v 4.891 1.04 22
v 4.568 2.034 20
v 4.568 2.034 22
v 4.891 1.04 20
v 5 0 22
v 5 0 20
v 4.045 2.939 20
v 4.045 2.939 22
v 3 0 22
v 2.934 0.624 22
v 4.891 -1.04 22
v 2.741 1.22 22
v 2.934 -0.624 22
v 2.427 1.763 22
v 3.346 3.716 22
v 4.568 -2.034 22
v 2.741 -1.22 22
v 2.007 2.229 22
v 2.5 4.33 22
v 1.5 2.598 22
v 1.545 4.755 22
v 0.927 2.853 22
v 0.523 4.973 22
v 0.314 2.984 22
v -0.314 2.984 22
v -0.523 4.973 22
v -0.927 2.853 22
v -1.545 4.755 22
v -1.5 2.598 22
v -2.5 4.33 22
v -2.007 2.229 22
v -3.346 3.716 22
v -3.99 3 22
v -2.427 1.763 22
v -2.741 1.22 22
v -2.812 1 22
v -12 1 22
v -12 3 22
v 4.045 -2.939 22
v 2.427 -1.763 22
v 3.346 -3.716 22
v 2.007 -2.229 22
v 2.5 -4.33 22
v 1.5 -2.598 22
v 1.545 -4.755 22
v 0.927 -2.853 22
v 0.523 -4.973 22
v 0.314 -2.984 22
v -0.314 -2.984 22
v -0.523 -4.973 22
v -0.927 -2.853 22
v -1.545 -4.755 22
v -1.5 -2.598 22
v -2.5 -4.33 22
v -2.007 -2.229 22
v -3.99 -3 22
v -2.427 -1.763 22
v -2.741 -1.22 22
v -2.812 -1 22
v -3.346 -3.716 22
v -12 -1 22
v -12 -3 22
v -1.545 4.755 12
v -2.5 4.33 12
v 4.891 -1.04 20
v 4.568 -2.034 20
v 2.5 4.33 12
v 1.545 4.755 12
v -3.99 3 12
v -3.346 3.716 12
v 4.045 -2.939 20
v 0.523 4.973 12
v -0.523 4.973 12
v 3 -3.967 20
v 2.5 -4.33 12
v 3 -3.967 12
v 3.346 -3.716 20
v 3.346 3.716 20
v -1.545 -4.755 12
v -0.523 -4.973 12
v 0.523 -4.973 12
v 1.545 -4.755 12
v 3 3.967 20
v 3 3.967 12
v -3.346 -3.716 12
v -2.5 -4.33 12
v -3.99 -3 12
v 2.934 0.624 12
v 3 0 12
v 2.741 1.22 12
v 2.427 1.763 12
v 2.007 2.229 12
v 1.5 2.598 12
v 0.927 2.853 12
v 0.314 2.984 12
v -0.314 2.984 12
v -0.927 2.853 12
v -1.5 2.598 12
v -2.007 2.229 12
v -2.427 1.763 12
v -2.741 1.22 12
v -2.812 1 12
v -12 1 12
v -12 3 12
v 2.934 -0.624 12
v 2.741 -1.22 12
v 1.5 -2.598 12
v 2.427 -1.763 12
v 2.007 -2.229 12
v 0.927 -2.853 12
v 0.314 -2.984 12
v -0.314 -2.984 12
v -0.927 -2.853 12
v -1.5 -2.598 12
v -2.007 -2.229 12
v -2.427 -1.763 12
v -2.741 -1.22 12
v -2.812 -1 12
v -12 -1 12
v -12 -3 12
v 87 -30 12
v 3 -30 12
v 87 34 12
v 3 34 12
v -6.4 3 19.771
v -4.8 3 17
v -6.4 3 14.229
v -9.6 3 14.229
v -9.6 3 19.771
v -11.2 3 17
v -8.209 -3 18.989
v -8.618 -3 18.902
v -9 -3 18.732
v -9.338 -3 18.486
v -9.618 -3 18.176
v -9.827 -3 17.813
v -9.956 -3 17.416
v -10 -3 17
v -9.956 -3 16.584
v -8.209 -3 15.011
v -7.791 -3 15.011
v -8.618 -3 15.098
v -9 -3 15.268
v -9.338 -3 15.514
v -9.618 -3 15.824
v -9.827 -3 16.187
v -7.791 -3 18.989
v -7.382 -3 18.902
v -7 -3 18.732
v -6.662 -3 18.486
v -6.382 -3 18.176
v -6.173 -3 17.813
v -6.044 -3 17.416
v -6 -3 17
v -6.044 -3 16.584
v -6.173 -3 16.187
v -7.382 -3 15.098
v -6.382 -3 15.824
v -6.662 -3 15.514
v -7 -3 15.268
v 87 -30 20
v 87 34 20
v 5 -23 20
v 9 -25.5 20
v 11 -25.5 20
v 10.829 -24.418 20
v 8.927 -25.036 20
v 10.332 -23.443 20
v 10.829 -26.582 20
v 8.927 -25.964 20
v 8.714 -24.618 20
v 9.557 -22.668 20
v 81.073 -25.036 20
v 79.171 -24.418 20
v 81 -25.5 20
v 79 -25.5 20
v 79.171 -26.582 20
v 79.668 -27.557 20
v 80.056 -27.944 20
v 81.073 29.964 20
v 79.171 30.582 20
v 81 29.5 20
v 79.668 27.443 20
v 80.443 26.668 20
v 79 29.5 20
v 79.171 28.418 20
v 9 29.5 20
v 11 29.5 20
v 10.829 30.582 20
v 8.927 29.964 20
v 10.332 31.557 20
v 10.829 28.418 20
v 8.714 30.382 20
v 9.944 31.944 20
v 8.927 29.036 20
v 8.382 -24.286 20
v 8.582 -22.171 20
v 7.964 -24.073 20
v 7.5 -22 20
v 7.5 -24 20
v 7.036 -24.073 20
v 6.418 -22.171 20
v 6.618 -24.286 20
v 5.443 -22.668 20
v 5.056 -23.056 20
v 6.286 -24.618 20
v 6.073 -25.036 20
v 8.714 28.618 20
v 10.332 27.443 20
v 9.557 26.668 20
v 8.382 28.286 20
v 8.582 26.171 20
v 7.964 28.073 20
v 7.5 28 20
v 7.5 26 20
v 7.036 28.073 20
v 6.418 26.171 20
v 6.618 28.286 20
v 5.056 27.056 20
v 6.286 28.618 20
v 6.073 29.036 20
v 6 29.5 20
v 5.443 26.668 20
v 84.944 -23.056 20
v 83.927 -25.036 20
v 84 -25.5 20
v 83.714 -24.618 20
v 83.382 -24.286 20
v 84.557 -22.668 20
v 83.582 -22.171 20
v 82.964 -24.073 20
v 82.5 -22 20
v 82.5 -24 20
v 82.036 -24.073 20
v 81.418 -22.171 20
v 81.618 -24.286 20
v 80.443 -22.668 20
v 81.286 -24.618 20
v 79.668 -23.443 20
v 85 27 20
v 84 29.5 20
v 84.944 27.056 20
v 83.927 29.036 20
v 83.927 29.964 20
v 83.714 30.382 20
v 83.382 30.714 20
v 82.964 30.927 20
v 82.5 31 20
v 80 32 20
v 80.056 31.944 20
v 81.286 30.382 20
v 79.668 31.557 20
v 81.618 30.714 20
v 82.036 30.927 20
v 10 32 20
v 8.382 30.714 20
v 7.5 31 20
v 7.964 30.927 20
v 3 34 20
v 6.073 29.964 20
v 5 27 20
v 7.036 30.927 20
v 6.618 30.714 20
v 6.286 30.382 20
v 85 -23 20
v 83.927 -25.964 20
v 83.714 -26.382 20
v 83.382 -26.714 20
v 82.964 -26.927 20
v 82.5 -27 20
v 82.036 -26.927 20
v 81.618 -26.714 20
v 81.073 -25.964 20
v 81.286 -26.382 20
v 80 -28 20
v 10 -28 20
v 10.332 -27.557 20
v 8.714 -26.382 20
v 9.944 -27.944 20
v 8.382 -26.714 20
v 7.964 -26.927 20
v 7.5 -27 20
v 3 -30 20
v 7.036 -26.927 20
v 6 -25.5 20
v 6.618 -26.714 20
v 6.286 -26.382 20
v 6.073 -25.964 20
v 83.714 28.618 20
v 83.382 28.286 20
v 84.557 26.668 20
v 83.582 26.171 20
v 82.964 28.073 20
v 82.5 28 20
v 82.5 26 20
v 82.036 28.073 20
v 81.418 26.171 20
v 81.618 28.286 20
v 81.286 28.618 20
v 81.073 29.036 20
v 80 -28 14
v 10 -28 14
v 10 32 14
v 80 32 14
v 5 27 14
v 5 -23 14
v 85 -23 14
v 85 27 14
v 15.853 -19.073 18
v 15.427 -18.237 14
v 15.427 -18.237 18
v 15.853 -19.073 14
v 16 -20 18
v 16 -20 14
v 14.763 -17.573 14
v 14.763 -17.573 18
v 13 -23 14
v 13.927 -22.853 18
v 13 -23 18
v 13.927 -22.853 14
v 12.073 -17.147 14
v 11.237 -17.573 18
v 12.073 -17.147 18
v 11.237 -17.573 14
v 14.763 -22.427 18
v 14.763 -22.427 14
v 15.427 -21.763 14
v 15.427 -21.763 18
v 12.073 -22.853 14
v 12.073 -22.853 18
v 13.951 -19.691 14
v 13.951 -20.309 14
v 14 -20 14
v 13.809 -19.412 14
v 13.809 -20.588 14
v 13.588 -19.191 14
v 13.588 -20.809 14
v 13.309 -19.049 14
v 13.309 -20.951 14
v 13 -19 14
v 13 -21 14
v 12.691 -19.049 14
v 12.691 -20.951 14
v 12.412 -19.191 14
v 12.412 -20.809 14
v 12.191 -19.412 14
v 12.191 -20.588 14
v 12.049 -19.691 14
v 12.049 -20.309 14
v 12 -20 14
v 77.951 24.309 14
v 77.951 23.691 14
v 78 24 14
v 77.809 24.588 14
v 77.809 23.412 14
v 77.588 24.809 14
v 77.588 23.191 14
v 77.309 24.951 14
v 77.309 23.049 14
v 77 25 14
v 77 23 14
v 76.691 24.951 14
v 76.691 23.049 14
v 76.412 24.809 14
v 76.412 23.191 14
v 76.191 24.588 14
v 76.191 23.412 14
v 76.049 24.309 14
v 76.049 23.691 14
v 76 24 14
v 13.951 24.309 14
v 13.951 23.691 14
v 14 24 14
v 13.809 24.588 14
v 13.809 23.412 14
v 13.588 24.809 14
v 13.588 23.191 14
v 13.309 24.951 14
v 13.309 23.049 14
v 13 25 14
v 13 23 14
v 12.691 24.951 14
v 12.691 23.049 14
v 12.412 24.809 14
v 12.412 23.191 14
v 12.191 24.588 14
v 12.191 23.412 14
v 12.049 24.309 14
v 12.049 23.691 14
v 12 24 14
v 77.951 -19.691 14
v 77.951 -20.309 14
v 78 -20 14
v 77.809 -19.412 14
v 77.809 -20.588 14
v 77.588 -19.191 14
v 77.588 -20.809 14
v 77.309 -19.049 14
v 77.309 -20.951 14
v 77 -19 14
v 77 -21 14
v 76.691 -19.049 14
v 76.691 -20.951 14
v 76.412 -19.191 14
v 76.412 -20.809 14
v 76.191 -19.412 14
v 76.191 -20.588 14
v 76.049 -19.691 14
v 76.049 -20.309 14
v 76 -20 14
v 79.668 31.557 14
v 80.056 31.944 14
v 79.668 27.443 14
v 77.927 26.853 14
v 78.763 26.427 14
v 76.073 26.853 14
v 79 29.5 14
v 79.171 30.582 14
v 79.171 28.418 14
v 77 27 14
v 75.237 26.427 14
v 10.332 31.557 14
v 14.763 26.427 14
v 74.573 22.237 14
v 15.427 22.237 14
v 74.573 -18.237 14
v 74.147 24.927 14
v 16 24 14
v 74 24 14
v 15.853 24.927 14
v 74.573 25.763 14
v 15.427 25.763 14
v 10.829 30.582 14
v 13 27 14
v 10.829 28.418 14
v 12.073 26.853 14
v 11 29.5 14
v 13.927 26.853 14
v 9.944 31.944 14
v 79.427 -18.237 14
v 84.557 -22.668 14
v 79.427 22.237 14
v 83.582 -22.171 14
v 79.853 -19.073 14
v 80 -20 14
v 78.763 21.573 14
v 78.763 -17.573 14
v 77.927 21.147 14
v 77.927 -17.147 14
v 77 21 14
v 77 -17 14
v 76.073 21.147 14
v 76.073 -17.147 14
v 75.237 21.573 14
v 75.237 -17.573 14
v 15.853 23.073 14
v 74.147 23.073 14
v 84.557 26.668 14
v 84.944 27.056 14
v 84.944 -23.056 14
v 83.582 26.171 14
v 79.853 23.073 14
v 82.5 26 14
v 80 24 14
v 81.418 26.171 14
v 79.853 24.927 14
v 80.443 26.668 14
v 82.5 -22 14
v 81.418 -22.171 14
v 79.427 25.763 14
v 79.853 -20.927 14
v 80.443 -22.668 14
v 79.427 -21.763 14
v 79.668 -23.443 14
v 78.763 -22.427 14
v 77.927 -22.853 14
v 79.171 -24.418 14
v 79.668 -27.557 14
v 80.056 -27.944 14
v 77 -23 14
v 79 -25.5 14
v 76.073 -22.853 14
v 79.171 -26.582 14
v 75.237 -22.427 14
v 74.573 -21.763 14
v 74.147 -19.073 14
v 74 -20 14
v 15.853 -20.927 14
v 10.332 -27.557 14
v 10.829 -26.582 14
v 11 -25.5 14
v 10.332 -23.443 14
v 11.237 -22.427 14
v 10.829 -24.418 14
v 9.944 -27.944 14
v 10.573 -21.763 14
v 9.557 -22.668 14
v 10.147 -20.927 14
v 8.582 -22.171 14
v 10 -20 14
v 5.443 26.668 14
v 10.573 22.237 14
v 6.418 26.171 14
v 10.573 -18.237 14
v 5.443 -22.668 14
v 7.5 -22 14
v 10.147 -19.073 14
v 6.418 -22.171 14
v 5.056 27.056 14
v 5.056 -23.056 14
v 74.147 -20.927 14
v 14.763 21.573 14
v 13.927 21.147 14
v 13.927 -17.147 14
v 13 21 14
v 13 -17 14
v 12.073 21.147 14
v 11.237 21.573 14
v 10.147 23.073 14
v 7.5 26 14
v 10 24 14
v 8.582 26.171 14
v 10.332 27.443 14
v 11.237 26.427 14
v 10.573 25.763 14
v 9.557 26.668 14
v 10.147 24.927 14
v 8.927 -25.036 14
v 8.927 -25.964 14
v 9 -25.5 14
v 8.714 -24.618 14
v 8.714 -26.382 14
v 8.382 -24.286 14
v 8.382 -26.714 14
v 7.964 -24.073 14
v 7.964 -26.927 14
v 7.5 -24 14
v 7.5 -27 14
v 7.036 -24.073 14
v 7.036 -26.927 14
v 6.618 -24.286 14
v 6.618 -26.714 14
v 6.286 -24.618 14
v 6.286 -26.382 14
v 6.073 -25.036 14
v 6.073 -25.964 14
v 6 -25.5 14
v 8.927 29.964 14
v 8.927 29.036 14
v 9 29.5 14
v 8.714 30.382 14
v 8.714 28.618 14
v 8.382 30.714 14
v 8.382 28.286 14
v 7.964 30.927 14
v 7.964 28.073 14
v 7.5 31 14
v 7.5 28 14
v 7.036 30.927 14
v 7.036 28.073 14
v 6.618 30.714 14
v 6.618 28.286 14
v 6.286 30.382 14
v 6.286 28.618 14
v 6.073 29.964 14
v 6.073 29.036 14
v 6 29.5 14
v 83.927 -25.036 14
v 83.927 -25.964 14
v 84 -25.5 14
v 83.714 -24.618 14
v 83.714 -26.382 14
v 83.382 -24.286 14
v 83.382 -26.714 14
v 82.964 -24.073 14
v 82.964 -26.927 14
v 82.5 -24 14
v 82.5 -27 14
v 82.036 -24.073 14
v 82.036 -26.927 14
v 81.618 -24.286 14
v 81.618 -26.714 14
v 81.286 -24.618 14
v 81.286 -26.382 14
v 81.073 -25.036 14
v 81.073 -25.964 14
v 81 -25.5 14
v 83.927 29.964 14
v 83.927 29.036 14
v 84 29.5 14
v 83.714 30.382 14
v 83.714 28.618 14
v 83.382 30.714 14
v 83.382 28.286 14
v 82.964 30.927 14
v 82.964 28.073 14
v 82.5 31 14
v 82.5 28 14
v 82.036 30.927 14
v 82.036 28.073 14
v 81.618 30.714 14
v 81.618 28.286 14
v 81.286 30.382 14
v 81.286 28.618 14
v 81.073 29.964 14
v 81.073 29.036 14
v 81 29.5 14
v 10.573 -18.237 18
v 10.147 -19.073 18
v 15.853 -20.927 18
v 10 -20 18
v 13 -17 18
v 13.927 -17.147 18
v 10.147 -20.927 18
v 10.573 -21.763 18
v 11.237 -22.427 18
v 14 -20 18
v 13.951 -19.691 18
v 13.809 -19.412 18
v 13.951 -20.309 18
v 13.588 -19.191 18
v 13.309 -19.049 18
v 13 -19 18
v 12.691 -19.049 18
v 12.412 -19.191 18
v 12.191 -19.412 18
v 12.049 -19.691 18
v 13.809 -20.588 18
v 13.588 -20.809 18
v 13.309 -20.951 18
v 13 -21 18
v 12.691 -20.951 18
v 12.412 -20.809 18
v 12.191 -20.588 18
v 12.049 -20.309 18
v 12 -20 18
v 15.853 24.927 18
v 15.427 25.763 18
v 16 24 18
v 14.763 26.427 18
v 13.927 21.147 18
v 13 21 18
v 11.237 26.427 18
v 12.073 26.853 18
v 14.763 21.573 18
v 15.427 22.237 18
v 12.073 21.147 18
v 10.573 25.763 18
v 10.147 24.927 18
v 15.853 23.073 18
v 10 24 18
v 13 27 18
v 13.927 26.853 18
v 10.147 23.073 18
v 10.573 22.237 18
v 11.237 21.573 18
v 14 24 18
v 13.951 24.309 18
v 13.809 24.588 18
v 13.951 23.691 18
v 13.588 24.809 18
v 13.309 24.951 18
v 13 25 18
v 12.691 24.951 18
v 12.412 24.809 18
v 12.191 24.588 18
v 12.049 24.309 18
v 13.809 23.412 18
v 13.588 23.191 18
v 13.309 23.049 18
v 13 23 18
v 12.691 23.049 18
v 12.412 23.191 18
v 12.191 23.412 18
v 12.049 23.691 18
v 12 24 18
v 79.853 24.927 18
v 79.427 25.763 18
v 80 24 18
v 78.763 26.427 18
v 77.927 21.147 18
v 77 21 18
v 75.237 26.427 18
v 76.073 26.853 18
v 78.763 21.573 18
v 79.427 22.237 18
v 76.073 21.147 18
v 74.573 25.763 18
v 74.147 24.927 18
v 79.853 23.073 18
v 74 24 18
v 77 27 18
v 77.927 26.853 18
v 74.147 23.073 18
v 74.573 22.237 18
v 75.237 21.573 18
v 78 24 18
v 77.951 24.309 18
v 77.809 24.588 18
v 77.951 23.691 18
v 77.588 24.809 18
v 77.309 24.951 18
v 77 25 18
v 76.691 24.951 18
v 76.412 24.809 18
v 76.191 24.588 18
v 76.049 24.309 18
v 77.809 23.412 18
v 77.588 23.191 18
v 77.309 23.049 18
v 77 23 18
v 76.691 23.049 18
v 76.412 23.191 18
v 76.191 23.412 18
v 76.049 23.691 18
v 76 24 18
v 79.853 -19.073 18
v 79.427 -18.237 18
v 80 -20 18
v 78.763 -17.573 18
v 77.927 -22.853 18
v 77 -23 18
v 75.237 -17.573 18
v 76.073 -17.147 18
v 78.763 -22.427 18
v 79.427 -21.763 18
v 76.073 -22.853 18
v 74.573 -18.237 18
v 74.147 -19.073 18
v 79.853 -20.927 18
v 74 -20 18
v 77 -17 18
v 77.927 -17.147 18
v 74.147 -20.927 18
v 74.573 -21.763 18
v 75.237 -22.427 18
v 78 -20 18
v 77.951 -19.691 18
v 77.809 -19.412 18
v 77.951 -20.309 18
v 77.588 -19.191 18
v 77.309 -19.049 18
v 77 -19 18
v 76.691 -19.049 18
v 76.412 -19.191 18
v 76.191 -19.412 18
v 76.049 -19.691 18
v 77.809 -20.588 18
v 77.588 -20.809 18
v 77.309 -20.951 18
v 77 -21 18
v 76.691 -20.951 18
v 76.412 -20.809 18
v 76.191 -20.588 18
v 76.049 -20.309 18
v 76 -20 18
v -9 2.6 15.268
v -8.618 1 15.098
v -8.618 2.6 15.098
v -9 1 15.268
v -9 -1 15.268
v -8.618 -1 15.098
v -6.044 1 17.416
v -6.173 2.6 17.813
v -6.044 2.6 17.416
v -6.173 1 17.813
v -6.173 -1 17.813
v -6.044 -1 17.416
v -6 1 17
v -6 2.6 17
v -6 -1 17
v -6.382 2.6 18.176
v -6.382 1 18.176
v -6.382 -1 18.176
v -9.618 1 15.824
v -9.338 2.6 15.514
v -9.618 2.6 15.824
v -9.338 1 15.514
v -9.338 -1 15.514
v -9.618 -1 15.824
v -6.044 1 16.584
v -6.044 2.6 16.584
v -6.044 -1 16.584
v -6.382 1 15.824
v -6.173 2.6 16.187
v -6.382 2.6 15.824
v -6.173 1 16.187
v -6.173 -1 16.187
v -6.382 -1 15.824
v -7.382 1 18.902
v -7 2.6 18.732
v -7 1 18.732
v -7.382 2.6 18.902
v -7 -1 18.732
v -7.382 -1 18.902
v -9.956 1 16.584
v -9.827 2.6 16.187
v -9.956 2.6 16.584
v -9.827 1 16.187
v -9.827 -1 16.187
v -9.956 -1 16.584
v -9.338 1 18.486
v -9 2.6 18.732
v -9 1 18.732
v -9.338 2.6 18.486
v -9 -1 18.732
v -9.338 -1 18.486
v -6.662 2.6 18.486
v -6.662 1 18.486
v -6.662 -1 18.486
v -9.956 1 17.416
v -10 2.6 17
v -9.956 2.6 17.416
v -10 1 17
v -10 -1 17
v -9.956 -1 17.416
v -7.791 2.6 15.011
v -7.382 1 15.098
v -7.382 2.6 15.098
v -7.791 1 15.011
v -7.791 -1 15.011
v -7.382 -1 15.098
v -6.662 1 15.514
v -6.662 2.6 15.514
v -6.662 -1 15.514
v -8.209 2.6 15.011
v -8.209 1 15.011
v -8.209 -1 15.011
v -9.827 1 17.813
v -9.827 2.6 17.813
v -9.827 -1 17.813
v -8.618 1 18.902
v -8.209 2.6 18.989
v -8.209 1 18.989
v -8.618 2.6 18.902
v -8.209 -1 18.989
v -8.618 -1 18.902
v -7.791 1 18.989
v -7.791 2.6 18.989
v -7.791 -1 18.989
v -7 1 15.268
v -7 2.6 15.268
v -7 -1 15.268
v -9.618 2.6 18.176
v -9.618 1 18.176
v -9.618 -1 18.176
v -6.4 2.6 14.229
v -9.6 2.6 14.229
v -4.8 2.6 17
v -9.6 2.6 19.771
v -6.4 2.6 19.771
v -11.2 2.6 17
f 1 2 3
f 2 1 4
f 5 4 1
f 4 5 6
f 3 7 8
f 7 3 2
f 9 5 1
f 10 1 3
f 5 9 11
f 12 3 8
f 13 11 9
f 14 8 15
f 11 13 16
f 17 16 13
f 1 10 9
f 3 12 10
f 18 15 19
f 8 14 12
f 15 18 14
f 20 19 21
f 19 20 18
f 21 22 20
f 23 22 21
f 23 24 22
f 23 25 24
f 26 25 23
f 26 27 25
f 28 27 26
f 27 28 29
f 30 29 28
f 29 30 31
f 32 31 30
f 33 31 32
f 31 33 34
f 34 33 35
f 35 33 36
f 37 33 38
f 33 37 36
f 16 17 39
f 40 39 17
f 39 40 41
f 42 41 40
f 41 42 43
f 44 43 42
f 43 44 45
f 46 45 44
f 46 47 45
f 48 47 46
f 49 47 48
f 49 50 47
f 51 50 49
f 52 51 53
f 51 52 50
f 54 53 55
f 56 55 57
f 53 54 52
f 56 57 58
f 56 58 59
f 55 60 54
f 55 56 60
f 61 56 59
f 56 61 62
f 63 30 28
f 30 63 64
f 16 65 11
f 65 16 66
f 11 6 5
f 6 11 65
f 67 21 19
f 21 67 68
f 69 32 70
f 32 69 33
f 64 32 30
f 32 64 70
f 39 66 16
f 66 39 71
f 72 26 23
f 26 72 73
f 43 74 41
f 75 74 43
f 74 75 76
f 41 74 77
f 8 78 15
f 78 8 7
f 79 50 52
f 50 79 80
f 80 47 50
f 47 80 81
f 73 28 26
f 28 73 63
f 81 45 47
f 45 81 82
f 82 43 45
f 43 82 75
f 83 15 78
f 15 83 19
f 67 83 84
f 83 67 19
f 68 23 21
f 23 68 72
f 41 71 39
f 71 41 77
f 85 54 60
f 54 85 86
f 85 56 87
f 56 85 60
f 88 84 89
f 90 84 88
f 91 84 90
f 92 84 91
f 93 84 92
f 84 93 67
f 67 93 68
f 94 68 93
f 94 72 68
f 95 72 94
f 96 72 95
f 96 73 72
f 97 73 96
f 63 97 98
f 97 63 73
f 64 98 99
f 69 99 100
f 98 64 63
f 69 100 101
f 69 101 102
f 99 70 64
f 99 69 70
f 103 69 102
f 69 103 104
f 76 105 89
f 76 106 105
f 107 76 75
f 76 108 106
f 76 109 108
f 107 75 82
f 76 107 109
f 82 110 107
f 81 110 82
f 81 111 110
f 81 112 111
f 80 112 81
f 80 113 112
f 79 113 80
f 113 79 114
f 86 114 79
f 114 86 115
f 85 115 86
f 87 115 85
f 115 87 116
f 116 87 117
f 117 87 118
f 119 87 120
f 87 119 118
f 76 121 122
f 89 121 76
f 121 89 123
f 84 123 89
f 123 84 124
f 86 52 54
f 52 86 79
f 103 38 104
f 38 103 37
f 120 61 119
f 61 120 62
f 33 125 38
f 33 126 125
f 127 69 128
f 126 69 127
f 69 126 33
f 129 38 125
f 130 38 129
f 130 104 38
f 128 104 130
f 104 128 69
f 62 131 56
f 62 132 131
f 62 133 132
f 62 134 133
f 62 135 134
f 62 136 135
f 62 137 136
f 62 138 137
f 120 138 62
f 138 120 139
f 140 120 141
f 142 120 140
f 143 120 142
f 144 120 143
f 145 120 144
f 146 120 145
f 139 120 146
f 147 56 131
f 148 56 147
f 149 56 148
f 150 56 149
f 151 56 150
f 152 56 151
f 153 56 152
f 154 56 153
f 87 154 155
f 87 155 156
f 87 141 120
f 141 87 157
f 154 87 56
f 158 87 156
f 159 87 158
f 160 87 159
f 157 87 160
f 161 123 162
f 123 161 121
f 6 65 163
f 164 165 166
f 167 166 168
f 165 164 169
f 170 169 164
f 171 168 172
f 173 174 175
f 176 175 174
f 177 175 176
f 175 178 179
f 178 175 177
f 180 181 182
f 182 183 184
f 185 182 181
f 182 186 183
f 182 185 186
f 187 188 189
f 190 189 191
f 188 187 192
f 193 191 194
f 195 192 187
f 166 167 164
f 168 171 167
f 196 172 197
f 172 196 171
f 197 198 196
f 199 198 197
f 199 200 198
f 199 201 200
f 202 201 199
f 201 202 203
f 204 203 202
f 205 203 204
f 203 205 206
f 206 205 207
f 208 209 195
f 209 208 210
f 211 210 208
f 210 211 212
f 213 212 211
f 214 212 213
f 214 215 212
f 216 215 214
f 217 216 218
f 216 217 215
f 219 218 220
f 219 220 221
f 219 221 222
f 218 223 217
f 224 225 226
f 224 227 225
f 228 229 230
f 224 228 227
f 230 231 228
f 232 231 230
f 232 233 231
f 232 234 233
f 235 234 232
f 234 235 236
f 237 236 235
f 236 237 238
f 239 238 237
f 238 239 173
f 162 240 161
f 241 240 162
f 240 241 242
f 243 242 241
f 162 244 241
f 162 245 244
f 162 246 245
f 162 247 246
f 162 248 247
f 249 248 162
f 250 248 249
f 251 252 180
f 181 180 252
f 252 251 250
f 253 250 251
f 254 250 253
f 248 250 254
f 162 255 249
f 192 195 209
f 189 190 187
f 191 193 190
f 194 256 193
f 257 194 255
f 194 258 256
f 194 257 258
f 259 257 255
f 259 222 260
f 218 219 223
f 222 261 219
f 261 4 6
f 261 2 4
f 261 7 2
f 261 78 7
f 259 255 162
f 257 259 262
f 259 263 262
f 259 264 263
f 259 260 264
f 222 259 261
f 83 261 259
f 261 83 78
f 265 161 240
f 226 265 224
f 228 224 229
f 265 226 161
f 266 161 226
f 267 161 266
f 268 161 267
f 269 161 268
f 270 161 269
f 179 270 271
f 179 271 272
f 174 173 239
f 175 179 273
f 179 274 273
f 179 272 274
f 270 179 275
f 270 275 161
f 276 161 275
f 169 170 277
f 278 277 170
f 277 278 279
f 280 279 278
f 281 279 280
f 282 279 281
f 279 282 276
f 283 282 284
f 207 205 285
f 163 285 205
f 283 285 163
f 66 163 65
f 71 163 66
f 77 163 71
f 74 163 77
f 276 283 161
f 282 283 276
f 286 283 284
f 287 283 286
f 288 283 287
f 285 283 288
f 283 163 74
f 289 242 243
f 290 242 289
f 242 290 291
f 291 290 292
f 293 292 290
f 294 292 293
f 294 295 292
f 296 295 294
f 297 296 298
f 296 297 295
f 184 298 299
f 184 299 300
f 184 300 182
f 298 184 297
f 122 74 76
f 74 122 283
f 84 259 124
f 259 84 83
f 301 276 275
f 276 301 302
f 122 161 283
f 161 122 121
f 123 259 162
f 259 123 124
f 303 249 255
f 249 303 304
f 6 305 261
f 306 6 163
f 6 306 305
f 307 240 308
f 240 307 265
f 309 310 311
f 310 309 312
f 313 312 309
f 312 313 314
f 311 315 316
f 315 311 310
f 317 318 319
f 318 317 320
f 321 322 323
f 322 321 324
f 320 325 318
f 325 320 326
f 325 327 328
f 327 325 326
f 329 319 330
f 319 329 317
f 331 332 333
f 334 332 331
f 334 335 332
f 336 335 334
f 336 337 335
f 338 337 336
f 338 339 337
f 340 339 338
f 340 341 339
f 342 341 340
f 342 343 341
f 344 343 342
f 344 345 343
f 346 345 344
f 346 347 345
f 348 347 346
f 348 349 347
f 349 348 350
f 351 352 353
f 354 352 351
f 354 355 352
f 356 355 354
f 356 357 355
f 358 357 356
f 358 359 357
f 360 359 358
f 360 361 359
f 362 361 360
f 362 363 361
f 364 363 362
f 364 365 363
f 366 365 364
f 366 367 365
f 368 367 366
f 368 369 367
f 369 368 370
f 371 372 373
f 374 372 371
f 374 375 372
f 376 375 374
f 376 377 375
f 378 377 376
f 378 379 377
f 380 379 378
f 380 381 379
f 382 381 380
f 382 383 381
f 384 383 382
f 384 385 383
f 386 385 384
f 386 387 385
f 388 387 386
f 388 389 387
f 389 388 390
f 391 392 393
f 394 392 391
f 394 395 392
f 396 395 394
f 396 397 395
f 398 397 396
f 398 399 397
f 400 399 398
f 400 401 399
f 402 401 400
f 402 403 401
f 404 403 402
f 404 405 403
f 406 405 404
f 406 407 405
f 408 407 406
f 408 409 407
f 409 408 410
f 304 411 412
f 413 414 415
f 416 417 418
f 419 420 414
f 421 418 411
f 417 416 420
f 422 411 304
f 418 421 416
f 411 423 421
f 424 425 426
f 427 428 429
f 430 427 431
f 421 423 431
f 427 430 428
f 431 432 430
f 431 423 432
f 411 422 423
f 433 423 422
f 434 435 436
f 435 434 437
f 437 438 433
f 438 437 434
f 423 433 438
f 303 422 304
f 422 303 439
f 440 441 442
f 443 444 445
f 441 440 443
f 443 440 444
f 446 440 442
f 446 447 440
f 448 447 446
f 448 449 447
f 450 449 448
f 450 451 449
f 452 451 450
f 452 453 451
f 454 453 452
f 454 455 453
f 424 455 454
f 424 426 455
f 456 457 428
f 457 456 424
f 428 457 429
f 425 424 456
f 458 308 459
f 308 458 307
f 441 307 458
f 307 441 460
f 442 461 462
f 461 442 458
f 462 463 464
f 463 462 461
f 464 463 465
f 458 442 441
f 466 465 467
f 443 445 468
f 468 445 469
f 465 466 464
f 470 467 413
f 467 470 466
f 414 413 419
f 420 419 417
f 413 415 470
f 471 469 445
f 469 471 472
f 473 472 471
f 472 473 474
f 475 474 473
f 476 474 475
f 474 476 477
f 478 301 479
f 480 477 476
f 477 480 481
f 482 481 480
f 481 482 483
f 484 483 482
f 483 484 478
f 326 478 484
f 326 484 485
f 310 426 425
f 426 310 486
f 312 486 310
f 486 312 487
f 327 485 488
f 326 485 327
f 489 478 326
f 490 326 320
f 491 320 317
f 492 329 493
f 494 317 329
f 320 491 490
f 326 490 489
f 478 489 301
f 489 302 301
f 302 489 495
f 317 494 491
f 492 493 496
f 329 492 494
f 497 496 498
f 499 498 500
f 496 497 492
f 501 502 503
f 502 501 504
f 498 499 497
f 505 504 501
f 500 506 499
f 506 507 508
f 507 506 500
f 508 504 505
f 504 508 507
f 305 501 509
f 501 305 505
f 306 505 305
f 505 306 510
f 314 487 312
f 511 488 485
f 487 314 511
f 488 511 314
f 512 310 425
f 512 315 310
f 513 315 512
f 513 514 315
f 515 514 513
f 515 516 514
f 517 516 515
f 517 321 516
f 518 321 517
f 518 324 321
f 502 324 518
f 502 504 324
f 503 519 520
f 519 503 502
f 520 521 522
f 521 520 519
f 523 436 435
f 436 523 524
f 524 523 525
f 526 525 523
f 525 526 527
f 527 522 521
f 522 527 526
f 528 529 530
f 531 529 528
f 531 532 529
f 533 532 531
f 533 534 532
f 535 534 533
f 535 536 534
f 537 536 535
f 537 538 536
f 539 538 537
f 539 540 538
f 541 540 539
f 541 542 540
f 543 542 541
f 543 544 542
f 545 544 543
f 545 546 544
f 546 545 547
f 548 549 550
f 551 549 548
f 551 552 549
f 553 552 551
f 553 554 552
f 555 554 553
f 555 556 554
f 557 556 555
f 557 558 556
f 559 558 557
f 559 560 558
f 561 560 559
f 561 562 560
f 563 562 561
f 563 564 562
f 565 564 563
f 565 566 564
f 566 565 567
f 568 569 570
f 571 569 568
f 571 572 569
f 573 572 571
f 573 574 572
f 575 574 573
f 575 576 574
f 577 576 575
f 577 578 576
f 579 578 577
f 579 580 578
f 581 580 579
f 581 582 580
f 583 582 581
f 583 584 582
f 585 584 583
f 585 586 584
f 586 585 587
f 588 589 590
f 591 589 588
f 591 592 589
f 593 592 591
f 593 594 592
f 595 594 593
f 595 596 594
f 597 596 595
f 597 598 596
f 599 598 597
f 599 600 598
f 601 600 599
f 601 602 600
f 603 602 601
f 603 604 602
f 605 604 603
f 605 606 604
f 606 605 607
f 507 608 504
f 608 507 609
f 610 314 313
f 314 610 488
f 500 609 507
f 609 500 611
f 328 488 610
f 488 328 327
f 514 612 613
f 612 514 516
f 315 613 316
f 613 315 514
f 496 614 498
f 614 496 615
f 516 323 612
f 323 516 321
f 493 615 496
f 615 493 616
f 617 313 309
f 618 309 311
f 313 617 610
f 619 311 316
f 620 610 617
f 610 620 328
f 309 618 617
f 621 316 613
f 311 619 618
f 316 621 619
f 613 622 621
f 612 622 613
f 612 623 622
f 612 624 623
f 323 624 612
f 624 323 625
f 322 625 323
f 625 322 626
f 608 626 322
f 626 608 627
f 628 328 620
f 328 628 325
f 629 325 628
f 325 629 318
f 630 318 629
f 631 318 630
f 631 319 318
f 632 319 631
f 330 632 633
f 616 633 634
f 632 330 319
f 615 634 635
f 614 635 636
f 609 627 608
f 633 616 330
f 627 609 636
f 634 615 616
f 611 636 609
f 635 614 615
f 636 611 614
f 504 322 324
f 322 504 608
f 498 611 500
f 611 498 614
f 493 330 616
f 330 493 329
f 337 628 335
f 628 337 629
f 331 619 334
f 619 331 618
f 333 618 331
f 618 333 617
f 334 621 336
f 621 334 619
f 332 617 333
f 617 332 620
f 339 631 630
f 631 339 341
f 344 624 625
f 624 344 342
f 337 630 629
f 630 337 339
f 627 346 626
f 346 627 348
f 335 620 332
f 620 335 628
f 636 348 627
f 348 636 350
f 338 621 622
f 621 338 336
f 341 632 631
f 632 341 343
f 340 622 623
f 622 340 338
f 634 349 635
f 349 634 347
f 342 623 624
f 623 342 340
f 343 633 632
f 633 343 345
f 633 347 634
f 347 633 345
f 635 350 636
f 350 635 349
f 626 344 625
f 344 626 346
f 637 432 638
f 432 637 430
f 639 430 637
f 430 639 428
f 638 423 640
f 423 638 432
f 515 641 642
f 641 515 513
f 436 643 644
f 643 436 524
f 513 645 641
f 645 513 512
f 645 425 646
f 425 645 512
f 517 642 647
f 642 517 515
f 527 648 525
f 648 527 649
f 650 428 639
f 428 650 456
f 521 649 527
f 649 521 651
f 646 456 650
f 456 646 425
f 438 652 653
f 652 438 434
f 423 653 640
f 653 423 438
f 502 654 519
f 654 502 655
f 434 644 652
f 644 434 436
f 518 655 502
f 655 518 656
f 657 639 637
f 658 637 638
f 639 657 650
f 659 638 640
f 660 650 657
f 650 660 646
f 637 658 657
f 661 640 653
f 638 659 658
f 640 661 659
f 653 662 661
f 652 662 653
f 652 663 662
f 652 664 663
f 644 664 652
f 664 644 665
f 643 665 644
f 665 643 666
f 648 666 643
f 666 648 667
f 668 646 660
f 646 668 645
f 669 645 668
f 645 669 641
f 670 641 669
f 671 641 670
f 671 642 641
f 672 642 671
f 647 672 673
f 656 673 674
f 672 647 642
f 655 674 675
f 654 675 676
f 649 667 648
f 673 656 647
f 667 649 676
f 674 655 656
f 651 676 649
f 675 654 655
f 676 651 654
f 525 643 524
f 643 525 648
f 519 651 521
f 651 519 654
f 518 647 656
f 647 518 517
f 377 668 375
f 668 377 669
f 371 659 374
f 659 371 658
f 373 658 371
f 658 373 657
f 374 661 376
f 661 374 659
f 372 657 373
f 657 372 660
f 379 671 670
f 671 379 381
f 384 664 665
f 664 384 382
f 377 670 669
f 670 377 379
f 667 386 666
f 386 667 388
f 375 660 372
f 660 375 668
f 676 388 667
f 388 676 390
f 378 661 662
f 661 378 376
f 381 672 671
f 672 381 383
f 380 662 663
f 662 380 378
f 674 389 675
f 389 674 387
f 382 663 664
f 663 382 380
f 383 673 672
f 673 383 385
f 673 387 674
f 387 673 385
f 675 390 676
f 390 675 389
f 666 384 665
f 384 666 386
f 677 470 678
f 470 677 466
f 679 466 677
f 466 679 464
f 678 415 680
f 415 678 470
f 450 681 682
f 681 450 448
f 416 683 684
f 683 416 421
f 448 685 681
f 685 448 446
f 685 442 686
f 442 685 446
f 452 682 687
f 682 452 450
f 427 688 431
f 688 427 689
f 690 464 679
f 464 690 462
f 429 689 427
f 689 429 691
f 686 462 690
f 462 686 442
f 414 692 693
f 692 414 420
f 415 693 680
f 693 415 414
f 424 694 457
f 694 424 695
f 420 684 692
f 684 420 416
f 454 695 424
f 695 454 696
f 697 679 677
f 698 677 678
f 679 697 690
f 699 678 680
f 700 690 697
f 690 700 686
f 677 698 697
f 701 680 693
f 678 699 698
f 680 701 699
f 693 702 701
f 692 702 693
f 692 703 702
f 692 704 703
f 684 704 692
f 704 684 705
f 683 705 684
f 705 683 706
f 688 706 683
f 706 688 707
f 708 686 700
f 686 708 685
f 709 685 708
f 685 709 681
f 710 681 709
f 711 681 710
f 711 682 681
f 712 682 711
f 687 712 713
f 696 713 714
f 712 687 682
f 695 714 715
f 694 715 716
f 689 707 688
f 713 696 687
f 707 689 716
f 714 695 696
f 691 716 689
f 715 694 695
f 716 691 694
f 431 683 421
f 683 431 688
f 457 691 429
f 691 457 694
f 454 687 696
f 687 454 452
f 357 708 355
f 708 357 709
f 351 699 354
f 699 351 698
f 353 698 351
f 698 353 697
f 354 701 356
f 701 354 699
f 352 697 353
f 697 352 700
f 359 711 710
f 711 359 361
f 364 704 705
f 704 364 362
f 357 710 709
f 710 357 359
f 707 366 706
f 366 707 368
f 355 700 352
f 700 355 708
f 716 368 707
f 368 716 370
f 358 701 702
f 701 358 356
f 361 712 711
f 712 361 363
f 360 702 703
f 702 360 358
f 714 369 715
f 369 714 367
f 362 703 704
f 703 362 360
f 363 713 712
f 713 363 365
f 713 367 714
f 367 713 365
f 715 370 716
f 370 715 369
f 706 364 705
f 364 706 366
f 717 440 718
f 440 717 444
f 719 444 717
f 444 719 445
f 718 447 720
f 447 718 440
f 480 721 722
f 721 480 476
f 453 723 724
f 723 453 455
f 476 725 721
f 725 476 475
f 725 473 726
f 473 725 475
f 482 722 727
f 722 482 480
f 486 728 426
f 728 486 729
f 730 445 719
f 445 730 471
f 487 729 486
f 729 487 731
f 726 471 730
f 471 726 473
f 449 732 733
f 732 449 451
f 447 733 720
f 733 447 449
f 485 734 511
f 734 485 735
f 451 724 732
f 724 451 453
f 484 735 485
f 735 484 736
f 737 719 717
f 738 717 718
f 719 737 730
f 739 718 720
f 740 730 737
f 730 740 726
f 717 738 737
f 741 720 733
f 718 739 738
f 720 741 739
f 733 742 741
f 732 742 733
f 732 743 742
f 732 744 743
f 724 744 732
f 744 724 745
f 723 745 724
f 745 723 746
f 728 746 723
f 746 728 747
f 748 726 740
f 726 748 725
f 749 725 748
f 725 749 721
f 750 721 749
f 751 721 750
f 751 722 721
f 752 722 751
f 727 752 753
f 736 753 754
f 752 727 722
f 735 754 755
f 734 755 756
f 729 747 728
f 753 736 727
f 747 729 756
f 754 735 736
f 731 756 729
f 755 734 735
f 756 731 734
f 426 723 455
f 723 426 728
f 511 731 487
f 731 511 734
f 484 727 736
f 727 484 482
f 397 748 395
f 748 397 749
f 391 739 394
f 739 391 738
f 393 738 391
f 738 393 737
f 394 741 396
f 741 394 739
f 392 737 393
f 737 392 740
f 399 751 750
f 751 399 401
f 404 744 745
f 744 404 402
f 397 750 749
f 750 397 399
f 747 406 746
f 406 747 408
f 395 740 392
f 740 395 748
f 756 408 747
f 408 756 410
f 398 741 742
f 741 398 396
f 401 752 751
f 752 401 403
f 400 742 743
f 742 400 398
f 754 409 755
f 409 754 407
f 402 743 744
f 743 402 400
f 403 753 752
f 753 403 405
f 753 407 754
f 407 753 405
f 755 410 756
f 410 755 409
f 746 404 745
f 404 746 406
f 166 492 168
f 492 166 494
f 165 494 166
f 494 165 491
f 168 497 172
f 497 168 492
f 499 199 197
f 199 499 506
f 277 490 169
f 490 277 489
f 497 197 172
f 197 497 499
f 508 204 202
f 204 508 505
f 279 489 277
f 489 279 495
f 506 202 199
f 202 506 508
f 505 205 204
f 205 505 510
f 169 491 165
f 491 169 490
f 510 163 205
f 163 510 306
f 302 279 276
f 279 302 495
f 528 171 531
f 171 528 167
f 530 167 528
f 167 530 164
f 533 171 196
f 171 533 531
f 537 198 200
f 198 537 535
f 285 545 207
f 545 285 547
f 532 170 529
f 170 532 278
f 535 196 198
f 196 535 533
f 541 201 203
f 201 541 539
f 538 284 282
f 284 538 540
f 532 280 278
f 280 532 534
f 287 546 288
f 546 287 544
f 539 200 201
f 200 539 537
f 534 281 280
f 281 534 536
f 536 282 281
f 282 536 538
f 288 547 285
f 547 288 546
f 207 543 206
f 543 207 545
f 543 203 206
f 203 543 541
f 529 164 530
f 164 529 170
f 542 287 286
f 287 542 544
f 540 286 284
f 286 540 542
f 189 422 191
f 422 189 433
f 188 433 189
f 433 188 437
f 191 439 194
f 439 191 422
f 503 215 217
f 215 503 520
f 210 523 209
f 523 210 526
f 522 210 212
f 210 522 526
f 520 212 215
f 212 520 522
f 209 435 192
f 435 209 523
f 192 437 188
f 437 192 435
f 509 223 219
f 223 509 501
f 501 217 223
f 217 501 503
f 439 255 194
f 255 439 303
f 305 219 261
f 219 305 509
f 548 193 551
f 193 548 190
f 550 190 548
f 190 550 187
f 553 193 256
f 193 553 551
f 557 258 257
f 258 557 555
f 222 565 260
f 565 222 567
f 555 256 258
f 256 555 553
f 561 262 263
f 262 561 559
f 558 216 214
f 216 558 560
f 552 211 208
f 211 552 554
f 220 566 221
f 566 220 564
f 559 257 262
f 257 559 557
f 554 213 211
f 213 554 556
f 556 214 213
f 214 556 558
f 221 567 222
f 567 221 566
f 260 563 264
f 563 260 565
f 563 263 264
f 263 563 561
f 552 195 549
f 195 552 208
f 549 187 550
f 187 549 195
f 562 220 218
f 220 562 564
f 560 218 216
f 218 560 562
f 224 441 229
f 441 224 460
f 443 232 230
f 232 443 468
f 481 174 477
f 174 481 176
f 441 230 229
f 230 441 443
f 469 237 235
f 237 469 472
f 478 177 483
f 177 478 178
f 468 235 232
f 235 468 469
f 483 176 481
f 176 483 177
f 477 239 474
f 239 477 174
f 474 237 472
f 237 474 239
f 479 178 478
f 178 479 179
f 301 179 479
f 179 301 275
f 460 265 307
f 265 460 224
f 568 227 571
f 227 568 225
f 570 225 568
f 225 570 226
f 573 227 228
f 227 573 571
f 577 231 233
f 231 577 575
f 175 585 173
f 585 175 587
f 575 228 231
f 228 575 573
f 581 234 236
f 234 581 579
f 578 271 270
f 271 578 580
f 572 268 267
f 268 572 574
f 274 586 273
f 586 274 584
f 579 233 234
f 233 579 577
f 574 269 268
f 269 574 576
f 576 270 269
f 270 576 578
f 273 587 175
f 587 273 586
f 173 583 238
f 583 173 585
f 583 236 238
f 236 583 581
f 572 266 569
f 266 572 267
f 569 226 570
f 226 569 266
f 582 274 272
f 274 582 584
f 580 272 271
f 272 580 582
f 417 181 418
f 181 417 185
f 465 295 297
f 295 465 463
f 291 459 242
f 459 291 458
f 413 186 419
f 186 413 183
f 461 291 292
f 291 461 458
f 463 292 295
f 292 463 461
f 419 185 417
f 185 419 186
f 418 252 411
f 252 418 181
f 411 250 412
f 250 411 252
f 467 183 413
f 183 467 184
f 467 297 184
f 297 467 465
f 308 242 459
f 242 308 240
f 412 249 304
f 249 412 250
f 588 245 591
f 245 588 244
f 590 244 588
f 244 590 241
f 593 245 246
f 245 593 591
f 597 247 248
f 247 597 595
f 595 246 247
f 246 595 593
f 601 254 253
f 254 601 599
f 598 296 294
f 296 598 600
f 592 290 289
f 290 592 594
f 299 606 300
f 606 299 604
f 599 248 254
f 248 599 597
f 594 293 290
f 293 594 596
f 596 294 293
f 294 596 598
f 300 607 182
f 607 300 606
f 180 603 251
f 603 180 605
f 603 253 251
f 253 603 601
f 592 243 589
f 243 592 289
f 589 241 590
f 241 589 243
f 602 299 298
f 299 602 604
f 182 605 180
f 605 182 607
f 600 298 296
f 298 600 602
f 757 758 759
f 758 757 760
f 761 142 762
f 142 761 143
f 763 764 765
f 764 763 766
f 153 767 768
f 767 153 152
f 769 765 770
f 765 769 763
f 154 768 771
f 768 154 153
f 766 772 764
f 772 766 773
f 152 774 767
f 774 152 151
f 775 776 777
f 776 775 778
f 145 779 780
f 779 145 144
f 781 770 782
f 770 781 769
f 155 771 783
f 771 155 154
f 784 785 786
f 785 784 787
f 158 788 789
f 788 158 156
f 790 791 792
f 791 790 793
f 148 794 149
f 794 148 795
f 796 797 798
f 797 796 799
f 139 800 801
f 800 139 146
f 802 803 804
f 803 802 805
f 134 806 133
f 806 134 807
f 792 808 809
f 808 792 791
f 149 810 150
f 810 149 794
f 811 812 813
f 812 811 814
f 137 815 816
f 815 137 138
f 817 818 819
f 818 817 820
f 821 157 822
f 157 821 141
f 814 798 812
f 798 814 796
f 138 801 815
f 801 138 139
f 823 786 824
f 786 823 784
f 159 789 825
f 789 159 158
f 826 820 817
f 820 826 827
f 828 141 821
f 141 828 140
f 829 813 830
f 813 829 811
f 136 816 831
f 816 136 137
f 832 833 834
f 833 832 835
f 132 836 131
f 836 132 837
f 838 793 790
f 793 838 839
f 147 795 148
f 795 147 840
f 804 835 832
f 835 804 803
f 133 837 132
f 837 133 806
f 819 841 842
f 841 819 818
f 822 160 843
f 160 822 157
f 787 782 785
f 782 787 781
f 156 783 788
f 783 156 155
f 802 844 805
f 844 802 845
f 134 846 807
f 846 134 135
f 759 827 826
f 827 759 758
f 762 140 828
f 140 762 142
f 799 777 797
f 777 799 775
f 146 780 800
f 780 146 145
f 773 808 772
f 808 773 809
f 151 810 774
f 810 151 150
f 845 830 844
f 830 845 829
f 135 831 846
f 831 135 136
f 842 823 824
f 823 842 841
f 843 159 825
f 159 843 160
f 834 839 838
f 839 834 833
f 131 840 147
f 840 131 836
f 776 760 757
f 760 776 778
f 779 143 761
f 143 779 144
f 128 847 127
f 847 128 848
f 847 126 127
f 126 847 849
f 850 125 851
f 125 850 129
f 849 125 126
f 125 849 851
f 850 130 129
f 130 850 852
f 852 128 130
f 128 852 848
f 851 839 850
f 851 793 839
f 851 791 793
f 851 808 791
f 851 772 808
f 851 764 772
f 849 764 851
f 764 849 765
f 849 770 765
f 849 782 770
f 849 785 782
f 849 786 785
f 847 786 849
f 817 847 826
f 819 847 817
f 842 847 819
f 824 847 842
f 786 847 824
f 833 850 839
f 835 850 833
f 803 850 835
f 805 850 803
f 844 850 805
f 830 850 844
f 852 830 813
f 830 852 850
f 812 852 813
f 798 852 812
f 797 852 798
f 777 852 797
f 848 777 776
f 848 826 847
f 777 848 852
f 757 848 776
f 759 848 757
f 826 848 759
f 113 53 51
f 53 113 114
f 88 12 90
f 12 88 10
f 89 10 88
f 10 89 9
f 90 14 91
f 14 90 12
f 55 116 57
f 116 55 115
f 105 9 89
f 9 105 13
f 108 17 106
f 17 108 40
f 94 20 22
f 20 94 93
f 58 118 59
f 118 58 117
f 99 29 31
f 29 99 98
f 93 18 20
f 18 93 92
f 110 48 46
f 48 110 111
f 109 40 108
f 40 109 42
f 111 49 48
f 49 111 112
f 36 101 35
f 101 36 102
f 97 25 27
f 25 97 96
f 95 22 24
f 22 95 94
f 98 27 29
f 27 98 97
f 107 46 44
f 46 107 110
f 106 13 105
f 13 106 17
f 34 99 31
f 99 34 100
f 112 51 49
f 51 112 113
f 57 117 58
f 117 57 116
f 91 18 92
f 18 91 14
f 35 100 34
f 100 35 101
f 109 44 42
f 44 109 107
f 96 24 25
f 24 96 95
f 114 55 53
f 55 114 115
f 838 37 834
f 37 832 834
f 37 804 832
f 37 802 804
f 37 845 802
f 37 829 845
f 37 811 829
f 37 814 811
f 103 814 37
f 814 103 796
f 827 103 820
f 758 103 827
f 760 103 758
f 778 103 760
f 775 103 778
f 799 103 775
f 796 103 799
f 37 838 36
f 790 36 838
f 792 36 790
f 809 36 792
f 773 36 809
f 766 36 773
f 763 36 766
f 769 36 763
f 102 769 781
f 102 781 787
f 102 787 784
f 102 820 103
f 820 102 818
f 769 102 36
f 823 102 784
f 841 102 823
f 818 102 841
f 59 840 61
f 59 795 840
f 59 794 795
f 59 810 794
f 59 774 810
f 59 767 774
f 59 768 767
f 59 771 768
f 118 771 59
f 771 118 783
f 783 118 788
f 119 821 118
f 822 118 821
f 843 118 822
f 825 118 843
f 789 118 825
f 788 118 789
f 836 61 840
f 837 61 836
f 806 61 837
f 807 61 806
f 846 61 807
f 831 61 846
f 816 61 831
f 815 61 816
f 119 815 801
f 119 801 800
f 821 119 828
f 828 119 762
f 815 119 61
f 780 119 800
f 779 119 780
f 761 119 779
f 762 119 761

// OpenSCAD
// file: pcb_box.scad
$fn = 20;


module pcb_box(
	wall = 2,
	pcb_sz_x = 30,
	pcb_sz_y = 50,
	pcb_sz_z = 1,
	pcb_under_sz_z = 4,
	pcb_wall_gap = 4,
	side_sz_z = 10,
	screw_d = 2,
	screw_holes = [],
	leg_sz_z = 0,
	leg_pos = [],
	leg_d = 5,
  corner_screw_d=3
) {
	translate([wall+pcb_wall_gap, wall+pcb_wall_gap, wall+pcb_under_sz_z]) {
%		cube([pcb_sz_x, pcb_sz_y, pcb_sz_z]);
	}
	translate([wall, wall, 0]) {
		cube([pcb_sz_x+2*pcb_wall_gap, pcb_sz_y+2*pcb_wall_gap, wall]);
	}
	for(y=[0, pcb_sz_y+2*pcb_wall_gap+wall]) {
		translate([0, y, 0]) {
			cube([pcb_sz_x+2*pcb_wall_gap+2*wall, wall, side_sz_z]);
		}
	}

	for(x=[0, pcb_sz_x+2*pcb_wall_gap+wall]) {
		translate([x, 0, 0]) {
			cube([wall, pcb_sz_y+2*pcb_wall_gap+2*wall, side_sz_z]);
		}
	}

	if(leg_sz_z>0) {
		for(p=leg_pos) {
			translate([wall+2*pcb_wall_gap+(p[0]>=0 ? p[0] : pcb_sz_x+p[0]), wall+2*pcb_wall_gap+(p[1]>=0 ? p[1] : pcb_sz_y+p[1]), -leg_sz_z/2]) {
				cylinder(d=leg_d, h=leg_sz_z, center=true);
			}
		}
	}

	for(p=screw_holes) {
		translate([wall+pcb_wall_gap+(p[0]>=0 ? p[0] : pcb_sz_x+p[0]),
				wall+pcb_wall_gap+(p[1]>=0 ? p[1] : pcb_sz_y+p[1]), wall+pcb_under_sz_z/2]) {
			difference() {
				cylinder(d=screw_d+2*wall, h=pcb_under_sz_z, center=true);
				cylinder(d=screw_d, h=pcb_under_sz_z, center=true);
			}
		}
	}

	if(pcb_wall_gap > 0) {
		for(x=[0,1]) {
			for(y=[0,1]) {
				translate([wall+pcb_wall_gap/2+x*(pcb_sz_x+pcb_wall_gap), wall+pcb_wall_gap/2+y*(pcb_sz_y+pcb_wall_gap), side_sz_z/2]) {
					difference() {
						union() {
							cylinder(d=corner_screw_d+2*wall, h=side_sz_z, center=true);
              translate([0, 0, -side_sz_z/2]) {
                rotate([0, 0, (y==0 ? 90*x : 180-90*(x-1))]) {
                  linear_extrude(height=side_sz_z)
                  {
                      translate([-pcb_wall_gap/2, -pcb_wall_gap/2, 0]) {
                        polygon(points=[[0,0],[pcb_wall_gap,0],[0,pcb_wall_gap]], paths=[[0,1,2]]);
                      }
                  }
                }
              }
						}
						cylinder(d=corner_screw_d, h=side_sz_z, center=true);
					}
				}
			}
		}
	}

}

module pcb_box_7x5(leg_sz_z=0, leg_pos=[]) {
	pcb_box(
		pcb_sz_x = 70,
		pcb_sz_y = 50,
		pcb_sz_z = 2,
    pcb_wall_gap = 5,
    side_sz_z = 8,
		screw_holes=[
			[3, 3],
			[3, -3],
			[-3, -3],
			[-3, 3],
		],
		leg_sz_z=leg_sz_z,
		leg_pos=leg_pos
	);
}

pcb_box_7x5();
// main file
$fn = 30;

use <MCAD/nuts_and_bolts.scad>
use <pcb_box.scad>

wall = 2;

vrod_d = 6;
vrod_sz_z = 100;

vrod_base_d = 30;
vrod_base_h = 10;

hrod_lock_d = vrod_d + 2 * wall;
hrod_lock_sz_z = 10;
hrod_sz_y = 60;

bolt_d = 4;

led_leg_dist = 2.5;
led_d = 4.5;
led_leg_d = 1.5;

module vrod() {
	translate([0, 0, vrod_base_h]) {
		cylinder(d=vrod_d, h=vrod_sz_z);
	}
	cylinder(d2=vrod_d, d1=vrod_base_d, h=vrod_base_h);
}

module lock_ring(plus=true) {
	if(plus) {
		union() {
			cylinder(d=hrod_lock_d, h=hrod_lock_sz_z);
			translate([-hrod_lock_d-wall, -wall*1.5, 0]) {
				cube([hrod_lock_d+wall, 3*wall, hrod_lock_sz_z]);
			}
		}
	} else {
		cylinder(d=vrod_d, h=hrod_lock_sz_z);
		translate([-hrod_lock_d-wall, -wall*0.5, 0]) {
			cube([hrod_lock_d+wall, wall, hrod_lock_sz_z]);
		}
		// bolt hole
		translate([-hrod_lock_d+bolt_d/2, hrod_lock_d*3/2, hrod_lock_d/2]) {
			rotate([90, 0, 0]) {
				cylinder(d=bolt_d, h=hrod_lock_d*3);
				translate([0, 0, hrod_lock_d*3/2-wall*2-1]) {
					nutHole(3);
				}
			}
		}
	}
}

module hrod() {
	difference() {
		union() {
			lock_ring();
			// led holder
			translate([hrod_lock_d/2-wall, -hrod_sz_y/2, 0]) {
				difference() {
					cube([wall, hrod_sz_y, hrod_lock_sz_z]);
					for(i=[0:9]) {
						translate([-5, 4+i*led_d+(i>=5 ? 12: 0), hrod_lock_sz_z/2+led_leg_dist/2]) {
							rotate([0, 90, 0]) {
								for(j=[0,1]) {
									translate([j*led_leg_dist, 0, 0]) {
										cylinder(d=led_leg_d, h=10);
									}
								}
							}
						}
					}
				}
			}
		}
		lock_ring(false);
	}
}

module vhrod() {
	difference() {
		union() {
			lock_ring();
			// led holder
			translate([hrod_lock_d/2-wall, -hrod_sz_y/2, 0]) {
				translate([0, hrod_sz_y/2, 0]) {
					cube([wall, 4, hrod_lock_sz_z]);
					translate([0, 4, -hrod_sz_y/2+5]) {
						difference() {
							cube([wall, hrod_lock_sz_z, hrod_sz_y]);
							for(i=[0:9]) {
								translate([-5, 0, 6+i*(led_d+0.5)]) {
									rotate([0, 90, 0]) {
										for(j=[0,1]) {
											translate([0, 4+j*led_leg_dist, 0]) {
												cylinder(d=led_leg_d, h=10);
											}
										}
									}
								}
							}
						}
					}
				}
			}
		}
		lock_ring(false);
	}
}

module control_support_box() {
	difference() {
		union() {
			lock_ring();
			translate([hrod_lock_d/2-wall, -30, 0]) {
				pcb_box_7x5(
					leg_pos=[
						[-6, -6],
						[-6, 6]
					]
				);
			}
		}
		lock_ring(false);
	}
}

//vrod();
translate([0, 0, vrod_sz_z/2]) {
//	vhrod();
}
translate([0, 0, vrod_base_h+wall]) {
  control_support_box();
}
